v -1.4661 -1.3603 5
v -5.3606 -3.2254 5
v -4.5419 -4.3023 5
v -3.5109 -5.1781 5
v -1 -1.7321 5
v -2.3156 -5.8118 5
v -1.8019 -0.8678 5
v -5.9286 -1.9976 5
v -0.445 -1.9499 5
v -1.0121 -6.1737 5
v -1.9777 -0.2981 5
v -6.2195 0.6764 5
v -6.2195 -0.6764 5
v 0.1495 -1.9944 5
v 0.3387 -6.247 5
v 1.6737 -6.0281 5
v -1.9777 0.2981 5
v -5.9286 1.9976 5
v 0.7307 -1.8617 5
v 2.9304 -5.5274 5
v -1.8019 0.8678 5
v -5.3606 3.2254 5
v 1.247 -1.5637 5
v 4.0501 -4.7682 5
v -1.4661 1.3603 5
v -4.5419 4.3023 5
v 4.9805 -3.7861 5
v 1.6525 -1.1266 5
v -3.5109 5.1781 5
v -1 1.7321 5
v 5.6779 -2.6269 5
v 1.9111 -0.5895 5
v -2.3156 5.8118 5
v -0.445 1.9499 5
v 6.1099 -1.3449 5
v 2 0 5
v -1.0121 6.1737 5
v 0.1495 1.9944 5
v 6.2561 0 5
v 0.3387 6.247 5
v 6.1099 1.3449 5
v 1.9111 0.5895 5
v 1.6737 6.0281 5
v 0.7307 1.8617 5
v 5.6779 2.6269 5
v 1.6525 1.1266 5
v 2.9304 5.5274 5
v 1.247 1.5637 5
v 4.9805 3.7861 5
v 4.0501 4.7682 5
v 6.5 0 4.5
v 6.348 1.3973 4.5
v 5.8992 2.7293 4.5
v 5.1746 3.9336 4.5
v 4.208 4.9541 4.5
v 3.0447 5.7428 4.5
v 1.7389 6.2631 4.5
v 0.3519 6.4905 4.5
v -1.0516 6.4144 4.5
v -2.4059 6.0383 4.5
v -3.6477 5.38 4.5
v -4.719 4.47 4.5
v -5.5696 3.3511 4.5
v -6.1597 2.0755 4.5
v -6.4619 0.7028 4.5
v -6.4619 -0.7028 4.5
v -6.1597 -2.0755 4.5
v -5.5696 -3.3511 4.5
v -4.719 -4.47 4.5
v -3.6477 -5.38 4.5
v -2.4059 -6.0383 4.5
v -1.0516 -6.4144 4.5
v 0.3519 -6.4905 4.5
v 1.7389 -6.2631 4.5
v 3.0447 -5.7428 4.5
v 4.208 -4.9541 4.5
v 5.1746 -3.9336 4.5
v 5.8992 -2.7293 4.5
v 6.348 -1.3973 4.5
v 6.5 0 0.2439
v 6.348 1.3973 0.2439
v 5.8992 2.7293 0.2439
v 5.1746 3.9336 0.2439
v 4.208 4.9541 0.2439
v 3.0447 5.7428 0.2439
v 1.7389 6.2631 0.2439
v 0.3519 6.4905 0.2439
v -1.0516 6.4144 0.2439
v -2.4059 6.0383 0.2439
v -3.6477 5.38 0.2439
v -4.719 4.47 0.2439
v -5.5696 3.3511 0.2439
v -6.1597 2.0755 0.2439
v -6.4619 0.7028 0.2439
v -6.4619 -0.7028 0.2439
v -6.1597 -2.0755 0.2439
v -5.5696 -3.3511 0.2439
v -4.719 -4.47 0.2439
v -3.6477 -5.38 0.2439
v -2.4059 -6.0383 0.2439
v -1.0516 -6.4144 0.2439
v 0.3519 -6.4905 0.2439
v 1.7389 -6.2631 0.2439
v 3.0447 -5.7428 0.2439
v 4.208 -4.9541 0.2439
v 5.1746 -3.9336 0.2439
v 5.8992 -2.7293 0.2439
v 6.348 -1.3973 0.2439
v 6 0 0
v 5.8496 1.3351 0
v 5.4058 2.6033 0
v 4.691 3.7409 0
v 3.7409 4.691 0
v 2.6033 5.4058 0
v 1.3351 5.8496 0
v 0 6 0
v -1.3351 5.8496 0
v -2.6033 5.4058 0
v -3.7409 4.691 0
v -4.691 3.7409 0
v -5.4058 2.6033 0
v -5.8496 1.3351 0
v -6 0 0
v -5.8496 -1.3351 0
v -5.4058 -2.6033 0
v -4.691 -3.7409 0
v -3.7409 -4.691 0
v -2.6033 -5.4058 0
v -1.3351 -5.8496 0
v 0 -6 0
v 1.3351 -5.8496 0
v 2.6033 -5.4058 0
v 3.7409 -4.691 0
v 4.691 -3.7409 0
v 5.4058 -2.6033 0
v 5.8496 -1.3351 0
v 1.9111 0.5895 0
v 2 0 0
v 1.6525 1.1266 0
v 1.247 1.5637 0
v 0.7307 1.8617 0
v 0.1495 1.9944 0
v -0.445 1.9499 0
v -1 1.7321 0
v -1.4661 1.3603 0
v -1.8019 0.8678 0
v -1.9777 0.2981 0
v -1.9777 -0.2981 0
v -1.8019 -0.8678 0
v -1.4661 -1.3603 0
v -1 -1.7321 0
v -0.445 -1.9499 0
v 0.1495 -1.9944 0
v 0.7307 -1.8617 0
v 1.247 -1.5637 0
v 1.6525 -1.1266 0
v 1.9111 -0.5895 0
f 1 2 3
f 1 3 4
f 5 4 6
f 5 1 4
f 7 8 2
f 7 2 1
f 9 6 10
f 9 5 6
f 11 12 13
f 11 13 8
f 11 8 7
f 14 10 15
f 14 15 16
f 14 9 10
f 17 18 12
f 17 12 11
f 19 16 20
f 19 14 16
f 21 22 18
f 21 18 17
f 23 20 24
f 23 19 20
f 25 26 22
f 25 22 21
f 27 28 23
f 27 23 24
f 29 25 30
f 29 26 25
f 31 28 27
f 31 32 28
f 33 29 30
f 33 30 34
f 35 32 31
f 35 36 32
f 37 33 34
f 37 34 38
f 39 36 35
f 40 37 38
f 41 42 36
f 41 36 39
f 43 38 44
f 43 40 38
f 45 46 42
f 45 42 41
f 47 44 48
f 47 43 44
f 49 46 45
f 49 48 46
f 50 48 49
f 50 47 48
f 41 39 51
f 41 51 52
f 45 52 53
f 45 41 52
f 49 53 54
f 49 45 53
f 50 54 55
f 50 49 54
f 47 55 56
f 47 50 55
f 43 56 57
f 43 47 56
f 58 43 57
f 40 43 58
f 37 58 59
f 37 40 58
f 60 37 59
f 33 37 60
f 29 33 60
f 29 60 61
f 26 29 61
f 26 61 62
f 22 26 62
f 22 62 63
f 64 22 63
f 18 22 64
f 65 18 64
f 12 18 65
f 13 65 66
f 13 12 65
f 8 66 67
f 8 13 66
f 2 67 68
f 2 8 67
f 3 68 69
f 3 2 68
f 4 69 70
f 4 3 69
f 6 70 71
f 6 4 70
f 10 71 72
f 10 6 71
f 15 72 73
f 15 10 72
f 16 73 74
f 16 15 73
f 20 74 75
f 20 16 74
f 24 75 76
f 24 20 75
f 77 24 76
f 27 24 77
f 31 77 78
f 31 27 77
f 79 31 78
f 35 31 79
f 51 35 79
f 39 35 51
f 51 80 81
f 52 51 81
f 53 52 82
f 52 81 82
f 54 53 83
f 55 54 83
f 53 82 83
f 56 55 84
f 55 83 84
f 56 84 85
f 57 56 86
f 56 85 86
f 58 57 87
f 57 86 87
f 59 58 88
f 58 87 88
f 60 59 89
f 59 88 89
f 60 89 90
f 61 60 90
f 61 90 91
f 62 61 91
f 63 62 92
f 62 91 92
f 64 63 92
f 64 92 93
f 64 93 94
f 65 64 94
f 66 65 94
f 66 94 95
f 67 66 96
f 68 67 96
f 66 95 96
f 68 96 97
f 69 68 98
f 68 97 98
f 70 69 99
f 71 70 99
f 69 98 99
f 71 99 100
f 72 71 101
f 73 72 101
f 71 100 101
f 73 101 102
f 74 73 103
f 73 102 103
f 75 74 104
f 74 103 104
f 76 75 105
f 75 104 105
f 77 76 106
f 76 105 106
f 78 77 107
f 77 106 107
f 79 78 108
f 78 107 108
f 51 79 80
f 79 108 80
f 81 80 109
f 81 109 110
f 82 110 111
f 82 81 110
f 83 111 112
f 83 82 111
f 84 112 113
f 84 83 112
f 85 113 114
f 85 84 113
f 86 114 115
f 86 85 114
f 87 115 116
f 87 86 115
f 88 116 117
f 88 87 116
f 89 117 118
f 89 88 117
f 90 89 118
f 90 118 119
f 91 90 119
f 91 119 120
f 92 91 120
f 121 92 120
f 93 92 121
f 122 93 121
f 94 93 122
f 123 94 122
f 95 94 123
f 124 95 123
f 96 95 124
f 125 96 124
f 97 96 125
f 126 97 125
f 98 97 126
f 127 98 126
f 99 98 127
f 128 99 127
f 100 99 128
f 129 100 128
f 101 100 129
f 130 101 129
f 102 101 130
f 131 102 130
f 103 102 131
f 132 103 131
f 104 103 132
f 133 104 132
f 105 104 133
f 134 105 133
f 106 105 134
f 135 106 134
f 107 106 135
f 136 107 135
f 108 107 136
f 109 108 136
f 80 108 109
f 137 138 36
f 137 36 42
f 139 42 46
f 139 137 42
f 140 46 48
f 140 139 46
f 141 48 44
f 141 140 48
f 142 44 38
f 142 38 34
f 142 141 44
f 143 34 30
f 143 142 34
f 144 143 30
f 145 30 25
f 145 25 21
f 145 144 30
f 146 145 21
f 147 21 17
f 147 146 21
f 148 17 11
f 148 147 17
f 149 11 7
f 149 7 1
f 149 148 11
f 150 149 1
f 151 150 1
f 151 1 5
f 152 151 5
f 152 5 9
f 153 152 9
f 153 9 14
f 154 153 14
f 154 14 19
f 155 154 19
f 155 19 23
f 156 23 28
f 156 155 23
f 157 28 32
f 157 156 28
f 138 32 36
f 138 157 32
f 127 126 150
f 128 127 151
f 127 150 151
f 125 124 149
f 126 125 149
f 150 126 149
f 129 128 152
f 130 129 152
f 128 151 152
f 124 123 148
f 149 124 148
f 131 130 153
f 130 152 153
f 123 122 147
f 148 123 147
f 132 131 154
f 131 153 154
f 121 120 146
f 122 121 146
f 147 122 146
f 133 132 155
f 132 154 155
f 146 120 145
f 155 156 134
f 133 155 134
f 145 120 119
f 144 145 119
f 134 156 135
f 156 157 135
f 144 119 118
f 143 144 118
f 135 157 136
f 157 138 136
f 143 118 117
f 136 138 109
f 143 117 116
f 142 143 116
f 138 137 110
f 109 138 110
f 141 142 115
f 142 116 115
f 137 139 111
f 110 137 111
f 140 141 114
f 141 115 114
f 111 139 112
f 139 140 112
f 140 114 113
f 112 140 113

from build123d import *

# Parameters (mm, degrees)
SKETCH1_R             = 6.5
SKETCH1_R_2           = 2
BOSS_EXTRUDE1_DEPTH   = 5
CHAMFER1_SIZE         = 0.5
CHAMFER1_SIZE2        = 0.243866294
CHAMFER1_PART_2_SIZE  = 0.5
CHAMFER1_PART_2_SIZE2 = 0.243866294


with BuildPart() as part:
    # Sketch1 → Boss-Extrude1 (new body)
    with BuildSketch(Plane.XY):
        Circle(SKETCH1_R)
        Circle(SKETCH1_R_2, mode=Mode.SUBTRACT)
    extrude(amount=BOSS_EXTRUDE1_DEPTH)

    # Chamfer1
    chamfer1_edges = [part.edges().sort_by_distance(p)[0] for p in [
        (-6.5, 0, 0),
    ]]
    chamfer1_side = [part.faces().sort_by_distance(p)[0] for p in [
        (-6.316152237, 0, 0),
    ]]
    chamfer(chamfer1_edges, length=CHAMFER1_SIZE, length2=CHAMFER1_SIZE2, reference=chamfer1_side[0])

    # Chamfer1 part 2
    chamfer1_part_2_edges = [part.edges().sort_by_distance(p)[0] for p in [
        (-6.5, 0, 5),
    ]]
    chamfer1_part_2_side = [part.faces().sort_by_distance(p)[0] for p in [
        (-6.5, 0, 2.5),
    ]]
    chamfer(chamfer1_part_2_edges, length=CHAMFER1_PART_2_SIZE, length2=CHAMFER1_PART_2_SIZE2, reference=chamfer1_part_2_side[0])


solid = part.part
